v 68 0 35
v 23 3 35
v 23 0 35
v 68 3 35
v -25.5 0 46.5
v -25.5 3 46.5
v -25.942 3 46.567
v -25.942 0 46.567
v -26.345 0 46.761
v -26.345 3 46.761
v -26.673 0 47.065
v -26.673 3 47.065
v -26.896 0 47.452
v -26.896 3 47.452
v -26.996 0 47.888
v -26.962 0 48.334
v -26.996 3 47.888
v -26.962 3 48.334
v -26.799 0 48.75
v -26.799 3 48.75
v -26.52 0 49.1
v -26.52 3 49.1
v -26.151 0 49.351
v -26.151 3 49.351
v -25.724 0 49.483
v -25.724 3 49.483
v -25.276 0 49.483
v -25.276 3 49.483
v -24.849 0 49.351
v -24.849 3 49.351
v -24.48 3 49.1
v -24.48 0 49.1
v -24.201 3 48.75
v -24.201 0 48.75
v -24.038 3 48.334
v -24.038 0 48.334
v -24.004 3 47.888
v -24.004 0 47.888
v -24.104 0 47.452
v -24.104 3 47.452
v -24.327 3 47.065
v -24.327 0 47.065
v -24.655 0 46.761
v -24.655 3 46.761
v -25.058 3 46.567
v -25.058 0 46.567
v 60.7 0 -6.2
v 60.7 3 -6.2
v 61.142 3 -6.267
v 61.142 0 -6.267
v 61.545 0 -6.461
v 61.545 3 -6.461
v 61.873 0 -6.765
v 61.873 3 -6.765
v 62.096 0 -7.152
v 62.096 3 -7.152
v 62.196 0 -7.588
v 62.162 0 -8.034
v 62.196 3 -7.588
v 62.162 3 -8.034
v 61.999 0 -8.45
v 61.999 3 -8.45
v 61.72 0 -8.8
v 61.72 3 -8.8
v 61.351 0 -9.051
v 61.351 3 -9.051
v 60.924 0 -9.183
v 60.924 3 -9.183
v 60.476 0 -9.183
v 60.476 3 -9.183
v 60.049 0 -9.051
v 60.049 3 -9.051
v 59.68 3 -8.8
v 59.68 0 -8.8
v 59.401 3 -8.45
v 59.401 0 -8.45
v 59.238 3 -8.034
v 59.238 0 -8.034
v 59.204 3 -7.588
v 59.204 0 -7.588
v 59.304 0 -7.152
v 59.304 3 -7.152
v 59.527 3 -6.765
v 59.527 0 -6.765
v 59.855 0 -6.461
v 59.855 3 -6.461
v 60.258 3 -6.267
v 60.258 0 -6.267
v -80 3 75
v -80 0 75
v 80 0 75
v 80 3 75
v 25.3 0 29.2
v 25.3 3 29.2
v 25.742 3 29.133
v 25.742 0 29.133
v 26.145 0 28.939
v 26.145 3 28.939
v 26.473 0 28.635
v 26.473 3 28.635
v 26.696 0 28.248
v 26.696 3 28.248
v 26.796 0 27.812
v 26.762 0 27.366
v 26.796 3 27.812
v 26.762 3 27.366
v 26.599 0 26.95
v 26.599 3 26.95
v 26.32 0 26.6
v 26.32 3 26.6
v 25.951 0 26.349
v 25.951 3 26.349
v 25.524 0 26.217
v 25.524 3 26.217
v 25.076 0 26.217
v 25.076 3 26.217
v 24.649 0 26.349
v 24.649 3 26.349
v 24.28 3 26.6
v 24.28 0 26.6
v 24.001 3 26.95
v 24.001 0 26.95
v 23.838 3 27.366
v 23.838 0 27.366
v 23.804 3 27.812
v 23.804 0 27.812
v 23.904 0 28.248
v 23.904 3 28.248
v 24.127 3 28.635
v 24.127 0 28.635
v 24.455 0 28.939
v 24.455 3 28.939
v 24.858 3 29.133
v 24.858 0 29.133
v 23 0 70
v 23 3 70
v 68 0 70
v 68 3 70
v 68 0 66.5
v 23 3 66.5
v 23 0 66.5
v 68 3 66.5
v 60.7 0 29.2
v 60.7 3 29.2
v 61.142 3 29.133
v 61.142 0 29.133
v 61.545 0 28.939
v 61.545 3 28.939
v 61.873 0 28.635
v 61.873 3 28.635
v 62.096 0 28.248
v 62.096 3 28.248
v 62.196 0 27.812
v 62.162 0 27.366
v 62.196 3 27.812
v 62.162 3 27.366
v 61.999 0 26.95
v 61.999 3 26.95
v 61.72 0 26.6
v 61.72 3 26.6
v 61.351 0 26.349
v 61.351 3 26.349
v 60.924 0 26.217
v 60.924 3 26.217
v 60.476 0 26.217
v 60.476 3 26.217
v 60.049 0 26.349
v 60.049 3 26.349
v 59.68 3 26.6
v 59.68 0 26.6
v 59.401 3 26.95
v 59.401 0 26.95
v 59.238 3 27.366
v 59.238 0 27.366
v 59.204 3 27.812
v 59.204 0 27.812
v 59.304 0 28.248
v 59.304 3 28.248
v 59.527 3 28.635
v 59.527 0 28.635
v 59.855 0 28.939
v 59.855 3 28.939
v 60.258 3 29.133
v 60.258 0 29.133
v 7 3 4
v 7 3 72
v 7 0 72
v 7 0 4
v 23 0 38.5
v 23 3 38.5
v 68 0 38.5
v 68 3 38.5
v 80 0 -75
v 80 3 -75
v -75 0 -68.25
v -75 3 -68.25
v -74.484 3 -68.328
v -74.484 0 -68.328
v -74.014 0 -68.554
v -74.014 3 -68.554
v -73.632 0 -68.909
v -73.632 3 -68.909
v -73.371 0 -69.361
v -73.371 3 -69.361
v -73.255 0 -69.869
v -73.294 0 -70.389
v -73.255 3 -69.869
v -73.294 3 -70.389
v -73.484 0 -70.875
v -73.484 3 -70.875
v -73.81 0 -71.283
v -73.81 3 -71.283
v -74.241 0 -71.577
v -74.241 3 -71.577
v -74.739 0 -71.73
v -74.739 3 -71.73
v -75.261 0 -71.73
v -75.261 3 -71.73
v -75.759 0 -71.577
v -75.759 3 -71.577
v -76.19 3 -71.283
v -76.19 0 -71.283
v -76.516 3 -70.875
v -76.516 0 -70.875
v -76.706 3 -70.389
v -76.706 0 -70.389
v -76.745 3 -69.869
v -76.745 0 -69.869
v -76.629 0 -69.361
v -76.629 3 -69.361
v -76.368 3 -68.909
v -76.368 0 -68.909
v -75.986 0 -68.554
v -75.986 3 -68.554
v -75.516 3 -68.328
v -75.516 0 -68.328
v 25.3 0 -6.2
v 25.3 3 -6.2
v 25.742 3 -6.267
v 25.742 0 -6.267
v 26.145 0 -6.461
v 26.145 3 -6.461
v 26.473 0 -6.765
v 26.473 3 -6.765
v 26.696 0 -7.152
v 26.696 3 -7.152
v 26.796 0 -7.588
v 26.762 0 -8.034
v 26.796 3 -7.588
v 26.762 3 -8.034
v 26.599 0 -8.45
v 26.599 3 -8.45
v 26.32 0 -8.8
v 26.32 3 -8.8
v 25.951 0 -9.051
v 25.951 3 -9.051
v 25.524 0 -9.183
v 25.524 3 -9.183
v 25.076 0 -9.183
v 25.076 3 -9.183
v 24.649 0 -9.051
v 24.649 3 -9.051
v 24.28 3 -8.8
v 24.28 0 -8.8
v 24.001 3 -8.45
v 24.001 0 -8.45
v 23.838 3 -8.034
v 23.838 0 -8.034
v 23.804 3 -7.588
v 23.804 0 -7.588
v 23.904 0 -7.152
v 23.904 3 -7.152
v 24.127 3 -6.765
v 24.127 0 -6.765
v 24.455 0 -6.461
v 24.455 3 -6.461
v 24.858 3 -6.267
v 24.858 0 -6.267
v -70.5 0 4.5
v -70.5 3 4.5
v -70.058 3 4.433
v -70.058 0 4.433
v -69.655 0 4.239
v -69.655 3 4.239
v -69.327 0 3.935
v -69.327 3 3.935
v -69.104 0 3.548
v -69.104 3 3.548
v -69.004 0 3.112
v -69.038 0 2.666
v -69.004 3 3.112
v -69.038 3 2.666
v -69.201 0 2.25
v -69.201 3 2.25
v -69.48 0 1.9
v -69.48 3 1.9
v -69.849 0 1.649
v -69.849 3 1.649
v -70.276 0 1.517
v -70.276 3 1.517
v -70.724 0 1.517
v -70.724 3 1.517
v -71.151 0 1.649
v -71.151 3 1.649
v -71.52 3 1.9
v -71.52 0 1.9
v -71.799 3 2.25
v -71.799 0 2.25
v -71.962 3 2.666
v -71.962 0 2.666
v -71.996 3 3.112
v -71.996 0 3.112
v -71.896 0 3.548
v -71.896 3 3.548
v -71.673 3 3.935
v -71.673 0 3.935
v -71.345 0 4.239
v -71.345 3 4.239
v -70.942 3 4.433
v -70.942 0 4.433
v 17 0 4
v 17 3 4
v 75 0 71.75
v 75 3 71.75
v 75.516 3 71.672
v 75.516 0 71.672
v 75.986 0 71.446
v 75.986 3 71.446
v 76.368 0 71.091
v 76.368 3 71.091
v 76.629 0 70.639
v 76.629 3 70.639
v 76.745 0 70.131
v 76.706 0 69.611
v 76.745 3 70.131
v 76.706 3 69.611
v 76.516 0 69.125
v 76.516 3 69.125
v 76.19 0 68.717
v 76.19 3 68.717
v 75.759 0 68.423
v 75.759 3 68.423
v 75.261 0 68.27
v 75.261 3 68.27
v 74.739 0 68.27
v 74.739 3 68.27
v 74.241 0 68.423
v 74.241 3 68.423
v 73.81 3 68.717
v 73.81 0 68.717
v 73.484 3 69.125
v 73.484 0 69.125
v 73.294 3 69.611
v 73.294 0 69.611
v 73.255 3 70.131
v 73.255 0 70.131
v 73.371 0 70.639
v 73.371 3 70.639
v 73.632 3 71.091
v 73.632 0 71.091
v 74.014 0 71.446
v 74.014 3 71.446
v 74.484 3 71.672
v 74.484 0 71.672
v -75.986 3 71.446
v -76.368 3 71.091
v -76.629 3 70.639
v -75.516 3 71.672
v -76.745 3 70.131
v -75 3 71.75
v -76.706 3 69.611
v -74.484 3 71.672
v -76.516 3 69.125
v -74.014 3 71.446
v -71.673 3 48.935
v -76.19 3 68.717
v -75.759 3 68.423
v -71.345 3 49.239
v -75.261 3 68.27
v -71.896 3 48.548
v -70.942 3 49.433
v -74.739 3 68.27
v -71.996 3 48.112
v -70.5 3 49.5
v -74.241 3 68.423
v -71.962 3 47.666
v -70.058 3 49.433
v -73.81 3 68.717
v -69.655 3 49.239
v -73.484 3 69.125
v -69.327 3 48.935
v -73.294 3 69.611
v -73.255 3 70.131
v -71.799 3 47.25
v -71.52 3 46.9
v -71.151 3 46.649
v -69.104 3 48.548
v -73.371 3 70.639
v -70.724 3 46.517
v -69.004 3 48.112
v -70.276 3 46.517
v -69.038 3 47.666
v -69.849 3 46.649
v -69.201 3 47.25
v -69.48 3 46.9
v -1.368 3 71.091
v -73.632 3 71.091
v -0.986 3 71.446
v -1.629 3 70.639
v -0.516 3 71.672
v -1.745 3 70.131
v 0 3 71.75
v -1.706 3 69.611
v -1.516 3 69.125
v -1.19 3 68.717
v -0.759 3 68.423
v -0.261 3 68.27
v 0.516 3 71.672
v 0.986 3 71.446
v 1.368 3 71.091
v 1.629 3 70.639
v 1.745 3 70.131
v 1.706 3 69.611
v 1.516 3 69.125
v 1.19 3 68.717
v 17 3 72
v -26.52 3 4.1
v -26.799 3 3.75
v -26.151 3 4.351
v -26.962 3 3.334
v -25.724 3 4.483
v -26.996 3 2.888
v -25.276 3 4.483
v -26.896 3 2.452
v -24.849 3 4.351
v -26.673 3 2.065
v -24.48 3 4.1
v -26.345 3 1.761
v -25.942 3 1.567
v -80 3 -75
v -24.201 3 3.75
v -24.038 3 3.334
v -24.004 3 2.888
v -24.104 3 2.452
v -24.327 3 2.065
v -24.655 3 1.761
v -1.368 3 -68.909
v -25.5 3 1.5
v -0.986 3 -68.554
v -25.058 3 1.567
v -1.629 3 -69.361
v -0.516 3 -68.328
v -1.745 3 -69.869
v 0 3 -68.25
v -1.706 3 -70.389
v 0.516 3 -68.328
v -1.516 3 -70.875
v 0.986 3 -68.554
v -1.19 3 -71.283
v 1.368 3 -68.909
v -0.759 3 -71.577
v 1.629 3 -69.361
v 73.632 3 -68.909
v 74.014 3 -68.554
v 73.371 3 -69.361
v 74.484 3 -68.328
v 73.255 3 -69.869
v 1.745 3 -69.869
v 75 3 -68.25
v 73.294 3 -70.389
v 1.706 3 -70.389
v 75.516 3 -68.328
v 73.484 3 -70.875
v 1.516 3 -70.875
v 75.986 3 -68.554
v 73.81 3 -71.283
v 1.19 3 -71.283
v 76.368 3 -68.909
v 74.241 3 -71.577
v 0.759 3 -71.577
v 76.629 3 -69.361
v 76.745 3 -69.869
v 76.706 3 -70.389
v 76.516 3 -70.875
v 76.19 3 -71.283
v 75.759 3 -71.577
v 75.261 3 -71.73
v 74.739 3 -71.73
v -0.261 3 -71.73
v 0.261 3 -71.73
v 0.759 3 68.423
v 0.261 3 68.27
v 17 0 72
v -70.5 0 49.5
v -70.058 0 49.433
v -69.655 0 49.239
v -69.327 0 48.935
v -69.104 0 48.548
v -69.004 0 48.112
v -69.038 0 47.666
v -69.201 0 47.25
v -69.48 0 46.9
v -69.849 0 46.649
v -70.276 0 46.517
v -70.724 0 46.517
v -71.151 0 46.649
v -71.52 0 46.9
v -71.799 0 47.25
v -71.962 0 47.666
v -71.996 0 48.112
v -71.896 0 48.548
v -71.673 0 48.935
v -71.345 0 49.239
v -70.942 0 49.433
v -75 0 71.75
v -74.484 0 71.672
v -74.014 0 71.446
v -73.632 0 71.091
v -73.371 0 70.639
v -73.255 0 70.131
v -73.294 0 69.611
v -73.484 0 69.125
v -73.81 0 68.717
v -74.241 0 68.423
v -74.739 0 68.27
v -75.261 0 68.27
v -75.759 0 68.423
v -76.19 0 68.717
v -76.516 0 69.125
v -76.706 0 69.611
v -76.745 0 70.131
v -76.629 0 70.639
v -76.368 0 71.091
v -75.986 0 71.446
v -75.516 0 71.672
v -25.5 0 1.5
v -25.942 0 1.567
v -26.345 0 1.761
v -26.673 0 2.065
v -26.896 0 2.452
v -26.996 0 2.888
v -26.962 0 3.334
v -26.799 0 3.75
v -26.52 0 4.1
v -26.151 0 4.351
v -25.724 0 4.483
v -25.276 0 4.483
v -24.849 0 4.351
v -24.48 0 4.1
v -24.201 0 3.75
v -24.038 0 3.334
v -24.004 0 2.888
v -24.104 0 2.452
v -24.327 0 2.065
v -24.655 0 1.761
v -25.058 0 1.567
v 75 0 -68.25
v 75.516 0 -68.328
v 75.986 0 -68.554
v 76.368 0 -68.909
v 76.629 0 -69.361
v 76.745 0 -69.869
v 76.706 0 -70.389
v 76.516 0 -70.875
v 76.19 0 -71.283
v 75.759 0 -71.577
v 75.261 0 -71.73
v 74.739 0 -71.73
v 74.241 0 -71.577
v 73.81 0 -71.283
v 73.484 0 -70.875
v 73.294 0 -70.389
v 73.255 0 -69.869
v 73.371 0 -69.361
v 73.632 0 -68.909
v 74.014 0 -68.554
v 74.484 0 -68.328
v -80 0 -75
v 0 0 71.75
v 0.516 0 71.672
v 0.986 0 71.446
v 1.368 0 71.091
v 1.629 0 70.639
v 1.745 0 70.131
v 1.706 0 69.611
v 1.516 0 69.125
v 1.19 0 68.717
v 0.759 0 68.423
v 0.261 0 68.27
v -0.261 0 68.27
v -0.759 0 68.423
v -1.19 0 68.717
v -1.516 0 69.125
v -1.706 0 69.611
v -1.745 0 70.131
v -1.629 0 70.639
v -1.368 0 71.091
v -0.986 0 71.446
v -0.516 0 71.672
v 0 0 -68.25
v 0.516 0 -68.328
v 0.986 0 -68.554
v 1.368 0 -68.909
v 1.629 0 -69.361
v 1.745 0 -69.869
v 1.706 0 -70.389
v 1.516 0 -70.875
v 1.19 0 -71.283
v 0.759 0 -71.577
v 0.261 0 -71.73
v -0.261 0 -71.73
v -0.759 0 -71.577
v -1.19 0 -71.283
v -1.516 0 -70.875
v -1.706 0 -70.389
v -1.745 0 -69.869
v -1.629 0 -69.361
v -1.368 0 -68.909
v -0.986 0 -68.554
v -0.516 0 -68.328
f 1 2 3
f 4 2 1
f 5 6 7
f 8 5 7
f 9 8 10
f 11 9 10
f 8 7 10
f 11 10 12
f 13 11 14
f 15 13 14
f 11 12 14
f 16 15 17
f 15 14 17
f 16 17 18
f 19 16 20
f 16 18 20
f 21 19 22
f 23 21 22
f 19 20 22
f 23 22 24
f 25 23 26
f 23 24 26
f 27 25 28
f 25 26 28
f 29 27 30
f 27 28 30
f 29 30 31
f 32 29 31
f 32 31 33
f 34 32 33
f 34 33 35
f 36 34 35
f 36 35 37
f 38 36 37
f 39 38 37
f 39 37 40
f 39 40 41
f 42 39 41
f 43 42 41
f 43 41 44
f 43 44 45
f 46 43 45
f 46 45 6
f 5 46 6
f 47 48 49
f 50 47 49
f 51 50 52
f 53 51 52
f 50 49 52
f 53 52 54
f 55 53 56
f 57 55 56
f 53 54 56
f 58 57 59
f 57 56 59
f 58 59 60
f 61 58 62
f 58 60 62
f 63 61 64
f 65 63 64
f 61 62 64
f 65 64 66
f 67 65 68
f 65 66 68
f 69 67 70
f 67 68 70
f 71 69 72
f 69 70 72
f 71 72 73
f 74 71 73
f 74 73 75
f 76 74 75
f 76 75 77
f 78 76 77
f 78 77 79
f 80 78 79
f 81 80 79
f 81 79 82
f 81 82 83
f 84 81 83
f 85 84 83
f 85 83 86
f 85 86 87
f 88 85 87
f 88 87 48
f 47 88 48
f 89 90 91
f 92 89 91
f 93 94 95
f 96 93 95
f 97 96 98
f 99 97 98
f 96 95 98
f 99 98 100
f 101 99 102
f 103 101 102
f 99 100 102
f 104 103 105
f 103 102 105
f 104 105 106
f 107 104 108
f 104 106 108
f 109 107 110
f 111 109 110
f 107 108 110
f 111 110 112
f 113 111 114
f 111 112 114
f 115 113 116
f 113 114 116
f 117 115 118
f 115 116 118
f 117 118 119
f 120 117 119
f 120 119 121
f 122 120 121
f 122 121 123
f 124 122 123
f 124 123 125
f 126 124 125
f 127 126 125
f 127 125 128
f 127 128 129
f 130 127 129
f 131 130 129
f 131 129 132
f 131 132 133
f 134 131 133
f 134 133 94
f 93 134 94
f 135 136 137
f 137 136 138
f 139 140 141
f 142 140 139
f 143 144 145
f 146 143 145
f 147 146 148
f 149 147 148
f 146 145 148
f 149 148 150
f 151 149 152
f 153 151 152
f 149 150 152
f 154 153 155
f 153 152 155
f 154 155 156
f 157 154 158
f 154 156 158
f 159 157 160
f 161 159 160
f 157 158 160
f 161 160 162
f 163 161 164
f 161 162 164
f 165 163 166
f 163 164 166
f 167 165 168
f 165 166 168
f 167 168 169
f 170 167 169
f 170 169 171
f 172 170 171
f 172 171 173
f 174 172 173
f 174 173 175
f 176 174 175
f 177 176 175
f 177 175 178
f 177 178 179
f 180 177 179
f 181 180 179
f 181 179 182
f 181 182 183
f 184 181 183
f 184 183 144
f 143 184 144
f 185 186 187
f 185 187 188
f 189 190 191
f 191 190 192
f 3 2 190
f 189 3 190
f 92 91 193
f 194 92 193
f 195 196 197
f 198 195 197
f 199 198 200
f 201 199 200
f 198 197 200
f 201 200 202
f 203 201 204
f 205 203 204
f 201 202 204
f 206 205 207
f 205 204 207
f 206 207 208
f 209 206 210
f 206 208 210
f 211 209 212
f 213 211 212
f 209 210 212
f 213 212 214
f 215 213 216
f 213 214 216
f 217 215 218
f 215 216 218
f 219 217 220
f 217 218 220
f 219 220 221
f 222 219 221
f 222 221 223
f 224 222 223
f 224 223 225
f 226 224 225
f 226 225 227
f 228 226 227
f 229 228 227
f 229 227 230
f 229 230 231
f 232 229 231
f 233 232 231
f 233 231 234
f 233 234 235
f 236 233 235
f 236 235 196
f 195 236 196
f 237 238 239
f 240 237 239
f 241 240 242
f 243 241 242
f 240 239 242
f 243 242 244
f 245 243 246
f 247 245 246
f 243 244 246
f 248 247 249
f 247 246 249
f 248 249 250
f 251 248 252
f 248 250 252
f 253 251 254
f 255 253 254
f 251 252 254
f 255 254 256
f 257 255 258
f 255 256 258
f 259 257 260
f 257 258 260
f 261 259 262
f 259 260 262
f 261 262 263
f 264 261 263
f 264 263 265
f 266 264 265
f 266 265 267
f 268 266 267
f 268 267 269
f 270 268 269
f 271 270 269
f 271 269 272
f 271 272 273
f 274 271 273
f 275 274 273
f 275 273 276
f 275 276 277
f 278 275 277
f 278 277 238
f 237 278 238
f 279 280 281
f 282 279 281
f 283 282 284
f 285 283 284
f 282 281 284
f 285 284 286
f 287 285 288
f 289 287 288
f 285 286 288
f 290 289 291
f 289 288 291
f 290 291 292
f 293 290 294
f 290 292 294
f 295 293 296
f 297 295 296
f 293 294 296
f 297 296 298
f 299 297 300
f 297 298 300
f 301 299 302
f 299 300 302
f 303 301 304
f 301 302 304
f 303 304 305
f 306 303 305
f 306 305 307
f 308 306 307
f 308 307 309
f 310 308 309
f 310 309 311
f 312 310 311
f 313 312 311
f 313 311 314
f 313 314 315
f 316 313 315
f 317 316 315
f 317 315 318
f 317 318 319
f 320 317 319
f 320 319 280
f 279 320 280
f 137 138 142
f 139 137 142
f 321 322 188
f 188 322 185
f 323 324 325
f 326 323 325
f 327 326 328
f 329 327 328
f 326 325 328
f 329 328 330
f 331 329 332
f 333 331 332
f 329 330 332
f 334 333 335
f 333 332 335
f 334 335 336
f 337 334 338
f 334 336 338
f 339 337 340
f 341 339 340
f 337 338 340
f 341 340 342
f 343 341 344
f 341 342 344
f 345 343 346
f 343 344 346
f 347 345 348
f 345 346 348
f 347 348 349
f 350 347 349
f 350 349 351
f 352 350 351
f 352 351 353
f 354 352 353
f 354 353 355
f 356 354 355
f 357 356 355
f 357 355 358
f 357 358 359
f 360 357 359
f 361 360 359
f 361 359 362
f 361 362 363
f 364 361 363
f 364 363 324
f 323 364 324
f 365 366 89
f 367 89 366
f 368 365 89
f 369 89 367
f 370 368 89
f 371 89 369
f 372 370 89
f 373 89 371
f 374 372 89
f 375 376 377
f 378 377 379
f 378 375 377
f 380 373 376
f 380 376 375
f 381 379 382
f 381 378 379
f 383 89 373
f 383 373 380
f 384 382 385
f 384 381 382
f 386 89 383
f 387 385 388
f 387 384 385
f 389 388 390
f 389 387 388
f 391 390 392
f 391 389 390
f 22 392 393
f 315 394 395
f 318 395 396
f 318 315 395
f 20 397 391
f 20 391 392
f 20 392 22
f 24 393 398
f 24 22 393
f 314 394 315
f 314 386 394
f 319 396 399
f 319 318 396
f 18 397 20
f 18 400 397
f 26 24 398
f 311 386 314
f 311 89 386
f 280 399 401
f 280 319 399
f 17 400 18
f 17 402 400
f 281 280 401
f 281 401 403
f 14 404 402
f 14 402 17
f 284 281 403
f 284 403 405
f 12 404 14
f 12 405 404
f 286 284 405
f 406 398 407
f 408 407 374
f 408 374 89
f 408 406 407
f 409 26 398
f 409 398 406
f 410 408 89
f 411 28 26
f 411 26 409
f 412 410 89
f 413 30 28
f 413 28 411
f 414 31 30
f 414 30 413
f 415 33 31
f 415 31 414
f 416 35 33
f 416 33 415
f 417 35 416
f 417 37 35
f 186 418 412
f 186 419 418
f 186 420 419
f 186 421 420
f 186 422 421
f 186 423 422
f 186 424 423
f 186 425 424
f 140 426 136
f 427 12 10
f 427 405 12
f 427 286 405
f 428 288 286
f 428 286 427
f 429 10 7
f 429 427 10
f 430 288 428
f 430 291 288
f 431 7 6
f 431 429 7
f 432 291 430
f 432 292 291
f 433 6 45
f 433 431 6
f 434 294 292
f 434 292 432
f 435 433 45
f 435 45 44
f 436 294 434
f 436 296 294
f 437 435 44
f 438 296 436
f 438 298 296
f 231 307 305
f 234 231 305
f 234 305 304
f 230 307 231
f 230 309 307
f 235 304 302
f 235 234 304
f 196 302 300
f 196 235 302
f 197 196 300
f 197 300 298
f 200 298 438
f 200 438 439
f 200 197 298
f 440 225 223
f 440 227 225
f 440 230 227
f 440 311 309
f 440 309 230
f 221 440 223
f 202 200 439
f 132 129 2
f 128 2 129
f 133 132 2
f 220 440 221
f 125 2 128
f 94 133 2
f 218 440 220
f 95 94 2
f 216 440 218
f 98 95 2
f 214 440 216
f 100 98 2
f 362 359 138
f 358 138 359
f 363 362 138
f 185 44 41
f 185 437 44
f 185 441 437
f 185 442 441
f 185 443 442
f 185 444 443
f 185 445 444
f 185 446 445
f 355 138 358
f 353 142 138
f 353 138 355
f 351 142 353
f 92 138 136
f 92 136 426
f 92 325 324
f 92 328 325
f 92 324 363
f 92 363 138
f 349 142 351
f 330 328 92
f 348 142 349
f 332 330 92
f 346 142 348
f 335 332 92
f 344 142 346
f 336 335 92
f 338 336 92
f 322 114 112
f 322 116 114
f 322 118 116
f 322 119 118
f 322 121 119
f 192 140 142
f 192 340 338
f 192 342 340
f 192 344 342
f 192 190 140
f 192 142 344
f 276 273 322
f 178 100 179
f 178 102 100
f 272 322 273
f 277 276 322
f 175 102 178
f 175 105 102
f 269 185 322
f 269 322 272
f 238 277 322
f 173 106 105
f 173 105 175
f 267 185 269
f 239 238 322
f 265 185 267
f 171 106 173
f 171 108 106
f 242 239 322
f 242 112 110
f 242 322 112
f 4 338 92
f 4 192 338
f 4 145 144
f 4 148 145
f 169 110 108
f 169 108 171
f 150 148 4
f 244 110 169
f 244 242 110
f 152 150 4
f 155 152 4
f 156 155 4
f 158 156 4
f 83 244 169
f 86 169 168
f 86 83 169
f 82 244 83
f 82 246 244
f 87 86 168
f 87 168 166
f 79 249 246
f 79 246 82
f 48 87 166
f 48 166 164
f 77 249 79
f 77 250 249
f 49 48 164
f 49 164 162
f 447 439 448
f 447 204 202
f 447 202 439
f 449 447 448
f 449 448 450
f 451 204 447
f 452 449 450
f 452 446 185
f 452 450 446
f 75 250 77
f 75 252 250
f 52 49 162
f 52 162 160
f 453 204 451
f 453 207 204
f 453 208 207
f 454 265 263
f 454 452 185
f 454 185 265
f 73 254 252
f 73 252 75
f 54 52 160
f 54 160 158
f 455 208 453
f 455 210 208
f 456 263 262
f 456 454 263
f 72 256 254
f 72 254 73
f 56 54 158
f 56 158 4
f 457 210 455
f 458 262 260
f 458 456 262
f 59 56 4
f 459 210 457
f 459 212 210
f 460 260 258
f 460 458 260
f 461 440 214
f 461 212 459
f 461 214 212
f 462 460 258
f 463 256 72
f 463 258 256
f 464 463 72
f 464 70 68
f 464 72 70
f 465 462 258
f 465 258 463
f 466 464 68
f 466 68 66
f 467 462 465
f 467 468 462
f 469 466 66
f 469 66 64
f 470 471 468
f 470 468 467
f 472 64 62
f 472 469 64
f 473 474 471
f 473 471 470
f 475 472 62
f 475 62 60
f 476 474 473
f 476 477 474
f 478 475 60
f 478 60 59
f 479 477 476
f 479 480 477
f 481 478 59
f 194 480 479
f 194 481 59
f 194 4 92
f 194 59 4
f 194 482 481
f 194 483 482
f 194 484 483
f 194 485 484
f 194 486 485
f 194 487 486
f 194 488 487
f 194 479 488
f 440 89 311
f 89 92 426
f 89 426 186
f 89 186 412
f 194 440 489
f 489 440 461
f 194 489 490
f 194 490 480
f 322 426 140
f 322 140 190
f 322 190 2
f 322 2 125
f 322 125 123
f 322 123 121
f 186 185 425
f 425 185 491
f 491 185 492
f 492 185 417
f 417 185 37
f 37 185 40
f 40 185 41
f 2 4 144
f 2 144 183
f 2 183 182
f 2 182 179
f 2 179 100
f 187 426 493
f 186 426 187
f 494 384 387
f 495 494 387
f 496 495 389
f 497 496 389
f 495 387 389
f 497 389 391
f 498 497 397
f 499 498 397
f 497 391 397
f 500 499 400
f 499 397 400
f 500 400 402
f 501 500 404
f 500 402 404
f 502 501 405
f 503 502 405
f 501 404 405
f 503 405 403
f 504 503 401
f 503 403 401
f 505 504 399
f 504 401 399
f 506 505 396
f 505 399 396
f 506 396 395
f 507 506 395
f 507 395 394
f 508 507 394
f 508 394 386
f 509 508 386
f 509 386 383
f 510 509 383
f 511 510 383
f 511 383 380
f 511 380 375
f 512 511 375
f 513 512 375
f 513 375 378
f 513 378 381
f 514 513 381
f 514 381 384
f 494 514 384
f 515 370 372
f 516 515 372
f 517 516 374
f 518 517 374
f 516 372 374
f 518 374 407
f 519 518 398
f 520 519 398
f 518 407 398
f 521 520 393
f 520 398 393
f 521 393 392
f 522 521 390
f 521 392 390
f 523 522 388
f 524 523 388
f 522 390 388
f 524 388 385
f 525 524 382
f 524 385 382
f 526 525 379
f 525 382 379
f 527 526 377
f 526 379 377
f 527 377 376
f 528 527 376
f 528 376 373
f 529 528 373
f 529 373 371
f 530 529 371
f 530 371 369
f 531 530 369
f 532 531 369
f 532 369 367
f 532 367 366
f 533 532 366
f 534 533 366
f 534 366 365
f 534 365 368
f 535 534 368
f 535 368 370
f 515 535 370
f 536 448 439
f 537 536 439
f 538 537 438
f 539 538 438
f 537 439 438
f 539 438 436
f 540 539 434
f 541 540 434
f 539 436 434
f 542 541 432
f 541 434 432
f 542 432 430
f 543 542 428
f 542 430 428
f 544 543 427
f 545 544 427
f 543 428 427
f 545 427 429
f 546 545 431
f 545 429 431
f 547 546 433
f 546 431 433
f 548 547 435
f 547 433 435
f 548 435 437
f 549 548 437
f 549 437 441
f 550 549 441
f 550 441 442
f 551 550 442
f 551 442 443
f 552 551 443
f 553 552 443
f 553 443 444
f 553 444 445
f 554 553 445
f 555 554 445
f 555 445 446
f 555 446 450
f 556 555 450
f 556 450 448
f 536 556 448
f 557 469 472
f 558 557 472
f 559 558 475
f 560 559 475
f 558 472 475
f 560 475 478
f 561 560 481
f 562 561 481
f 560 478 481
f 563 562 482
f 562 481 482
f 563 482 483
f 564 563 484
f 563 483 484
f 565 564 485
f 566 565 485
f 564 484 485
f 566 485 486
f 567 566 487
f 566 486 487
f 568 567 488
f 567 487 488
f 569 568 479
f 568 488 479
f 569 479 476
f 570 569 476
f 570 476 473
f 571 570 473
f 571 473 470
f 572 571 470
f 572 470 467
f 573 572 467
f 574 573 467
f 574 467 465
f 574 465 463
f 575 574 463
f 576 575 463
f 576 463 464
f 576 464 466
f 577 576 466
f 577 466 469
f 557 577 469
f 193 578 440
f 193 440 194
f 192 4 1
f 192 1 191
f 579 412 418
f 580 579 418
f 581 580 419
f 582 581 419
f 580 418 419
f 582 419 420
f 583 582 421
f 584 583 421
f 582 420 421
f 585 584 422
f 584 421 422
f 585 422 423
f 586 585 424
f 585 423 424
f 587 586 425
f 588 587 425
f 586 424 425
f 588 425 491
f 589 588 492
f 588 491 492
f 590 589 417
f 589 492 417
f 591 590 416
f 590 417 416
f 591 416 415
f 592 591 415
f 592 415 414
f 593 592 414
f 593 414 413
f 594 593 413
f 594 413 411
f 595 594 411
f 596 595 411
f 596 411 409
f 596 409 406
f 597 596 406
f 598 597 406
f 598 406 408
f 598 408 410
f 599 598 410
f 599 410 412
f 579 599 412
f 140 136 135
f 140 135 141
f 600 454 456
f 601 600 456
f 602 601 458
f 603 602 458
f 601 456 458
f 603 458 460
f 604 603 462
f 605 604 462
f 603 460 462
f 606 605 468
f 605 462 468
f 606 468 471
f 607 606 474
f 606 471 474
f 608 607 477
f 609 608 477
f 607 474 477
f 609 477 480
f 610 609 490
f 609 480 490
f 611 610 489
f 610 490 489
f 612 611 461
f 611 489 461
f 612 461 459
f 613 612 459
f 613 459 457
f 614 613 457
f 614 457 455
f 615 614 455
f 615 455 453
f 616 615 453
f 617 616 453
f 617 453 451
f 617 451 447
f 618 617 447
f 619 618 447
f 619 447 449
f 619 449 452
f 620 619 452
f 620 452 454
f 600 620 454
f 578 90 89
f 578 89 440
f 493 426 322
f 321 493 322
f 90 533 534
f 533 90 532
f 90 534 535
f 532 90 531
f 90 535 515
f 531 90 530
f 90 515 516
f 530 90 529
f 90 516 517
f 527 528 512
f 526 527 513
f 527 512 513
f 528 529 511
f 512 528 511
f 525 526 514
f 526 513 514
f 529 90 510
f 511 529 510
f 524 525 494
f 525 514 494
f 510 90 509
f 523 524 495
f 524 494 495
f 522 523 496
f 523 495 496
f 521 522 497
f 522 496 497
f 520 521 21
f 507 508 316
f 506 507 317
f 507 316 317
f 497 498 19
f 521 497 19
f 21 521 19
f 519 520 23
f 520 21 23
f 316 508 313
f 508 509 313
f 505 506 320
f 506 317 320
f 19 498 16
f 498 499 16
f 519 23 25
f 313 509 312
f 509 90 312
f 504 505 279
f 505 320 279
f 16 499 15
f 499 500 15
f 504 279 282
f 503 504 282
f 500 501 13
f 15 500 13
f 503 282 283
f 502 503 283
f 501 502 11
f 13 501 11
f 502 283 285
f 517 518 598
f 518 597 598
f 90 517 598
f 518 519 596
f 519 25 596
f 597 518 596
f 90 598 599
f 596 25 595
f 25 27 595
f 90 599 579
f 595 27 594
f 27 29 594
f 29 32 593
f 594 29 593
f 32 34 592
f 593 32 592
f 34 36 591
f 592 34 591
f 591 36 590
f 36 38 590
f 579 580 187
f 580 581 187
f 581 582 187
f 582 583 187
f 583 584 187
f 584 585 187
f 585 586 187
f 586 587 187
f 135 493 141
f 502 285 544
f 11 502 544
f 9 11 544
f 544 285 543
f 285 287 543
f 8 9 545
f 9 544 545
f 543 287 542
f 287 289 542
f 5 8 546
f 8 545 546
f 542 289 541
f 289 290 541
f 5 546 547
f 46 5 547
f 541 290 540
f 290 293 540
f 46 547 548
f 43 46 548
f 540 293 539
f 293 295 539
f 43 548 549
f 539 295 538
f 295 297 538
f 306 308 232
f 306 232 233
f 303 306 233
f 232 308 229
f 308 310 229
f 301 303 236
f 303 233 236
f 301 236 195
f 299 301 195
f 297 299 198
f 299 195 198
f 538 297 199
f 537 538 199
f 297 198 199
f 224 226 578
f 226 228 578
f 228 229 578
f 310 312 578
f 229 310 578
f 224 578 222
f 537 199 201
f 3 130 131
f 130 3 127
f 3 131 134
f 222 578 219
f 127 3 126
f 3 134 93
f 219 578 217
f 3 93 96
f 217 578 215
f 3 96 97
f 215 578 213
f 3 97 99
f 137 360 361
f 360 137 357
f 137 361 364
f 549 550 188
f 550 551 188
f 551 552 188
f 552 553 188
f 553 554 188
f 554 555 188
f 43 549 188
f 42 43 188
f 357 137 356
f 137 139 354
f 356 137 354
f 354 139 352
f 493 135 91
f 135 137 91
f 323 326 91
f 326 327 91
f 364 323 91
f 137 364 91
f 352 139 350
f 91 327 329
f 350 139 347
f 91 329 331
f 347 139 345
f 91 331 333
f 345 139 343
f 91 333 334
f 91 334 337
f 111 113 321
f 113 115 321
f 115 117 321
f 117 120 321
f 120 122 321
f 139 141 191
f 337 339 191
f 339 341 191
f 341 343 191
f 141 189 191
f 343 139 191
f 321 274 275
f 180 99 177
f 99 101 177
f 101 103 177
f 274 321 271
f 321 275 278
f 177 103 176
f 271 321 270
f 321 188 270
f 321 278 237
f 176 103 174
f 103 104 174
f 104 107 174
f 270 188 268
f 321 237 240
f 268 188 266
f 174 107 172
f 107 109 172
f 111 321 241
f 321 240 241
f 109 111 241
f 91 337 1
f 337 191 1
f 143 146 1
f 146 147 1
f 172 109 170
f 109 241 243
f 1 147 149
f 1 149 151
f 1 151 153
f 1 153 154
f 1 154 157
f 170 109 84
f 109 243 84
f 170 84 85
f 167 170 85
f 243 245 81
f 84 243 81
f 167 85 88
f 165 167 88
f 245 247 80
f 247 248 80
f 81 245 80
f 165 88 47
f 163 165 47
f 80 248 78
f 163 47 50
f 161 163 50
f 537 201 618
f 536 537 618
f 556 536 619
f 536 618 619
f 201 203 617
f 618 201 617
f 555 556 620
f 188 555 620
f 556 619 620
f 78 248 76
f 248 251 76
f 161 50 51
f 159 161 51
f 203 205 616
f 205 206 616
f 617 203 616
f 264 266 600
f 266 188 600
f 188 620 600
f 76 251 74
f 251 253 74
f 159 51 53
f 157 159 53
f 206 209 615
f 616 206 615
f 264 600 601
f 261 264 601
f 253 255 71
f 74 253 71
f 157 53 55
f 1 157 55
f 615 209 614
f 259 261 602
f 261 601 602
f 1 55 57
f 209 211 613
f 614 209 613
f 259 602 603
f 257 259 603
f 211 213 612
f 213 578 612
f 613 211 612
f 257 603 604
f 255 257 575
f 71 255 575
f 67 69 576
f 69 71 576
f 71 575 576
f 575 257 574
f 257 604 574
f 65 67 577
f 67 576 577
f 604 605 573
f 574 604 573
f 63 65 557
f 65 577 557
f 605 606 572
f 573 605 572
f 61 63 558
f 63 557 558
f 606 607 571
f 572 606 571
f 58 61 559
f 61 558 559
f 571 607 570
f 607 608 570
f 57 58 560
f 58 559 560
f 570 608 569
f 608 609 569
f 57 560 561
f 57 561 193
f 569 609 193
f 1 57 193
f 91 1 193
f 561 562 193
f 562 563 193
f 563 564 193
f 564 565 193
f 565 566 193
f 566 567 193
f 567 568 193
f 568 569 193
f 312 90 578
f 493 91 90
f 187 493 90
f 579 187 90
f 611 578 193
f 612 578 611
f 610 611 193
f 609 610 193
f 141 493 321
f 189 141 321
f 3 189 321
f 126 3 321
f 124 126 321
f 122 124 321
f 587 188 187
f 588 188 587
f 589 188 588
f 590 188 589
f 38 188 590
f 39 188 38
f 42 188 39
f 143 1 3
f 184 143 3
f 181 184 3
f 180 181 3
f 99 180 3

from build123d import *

# Parameters (mm, degrees)
SCHIZZO1_W                      = 160
SCHIZZO1_H                      = 150
BASE_DEPTH                      = 3
SCHIZZO2_W                      = 10
SCHIZZO2_H                      = 68
TAGLIOPMSINISTRA_DEPTH          = 110.69958979
SCHIZZO6_W                      = 45
SCHIZZO6_H                      = 3.5
FOROBECBASSO_DEPTH              = 110.69958979
SCHIZZO8_R                      = 1.5
FORIVITIPM_DEPTH                = 110.69958979
SCHIZZO9_R                      = 1.5
FORIVITICOMPANION_DEPTH         = 110.69958979
SCHIZZO12_R                     = 1.75
FORICOLLEGAMENTOFUSOLIERA_DEPTH = 110.69958979
SCHIZZO13_W                     = 10
SCHIZZO13_H                     = 68
CHIUSURATAGLIOSINISTROPM_DEPTH  = 3


with BuildPart() as part:
    # Schizzo1 → Base (new body)
    with BuildSketch(Plane(origin=(0, 0, 0), x_dir=(1, 0, 0), z_dir=(0, 1, 0))):
        Rectangle(SCHIZZO1_W, SCHIZZO1_H)
    extrude(amount=BASE_DEPTH)

    # Schizzo2 → TaglioPMSinistra (cut, through all)
    with BuildSketch(Plane(origin=(0, 3, 0), x_dir=(1, 0, 0), z_dir=(0, 1, 0))):
        with Locations((-58, -38)):
            Rectangle(SCHIZZO2_W, SCHIZZO2_H)
    tagliopmsinistra = extrude(amount=-TAGLIOPMSINISTRA_DEPTH, mode=Mode.SUBTRACT)

    # TaglioPMDestra: TaglioPMSinistra across plane
    add(tagliopmsinistra.mirror(Plane(origin=(-23, 0, 0), x_dir=(0, 0, 1), z_dir=(1, 0, 0))), mode=Mode.SUBTRACT)

    # Schizzo6 → ForoBECBasso (cut, through all)
    with BuildSketch(Plane(origin=(0, 3, 0), x_dir=(1, 0, 0), z_dir=(0, 1, 0))):
        with Locations((45.5, -68.25)):
            Rectangle(SCHIZZO6_W, SCHIZZO6_H)
    forobecbasso = extrude(amount=-FOROBECBASSO_DEPTH, mode=Mode.SUBTRACT)

    # ForoBECAlto: ForoBECBasso across plane
    add(forobecbasso.mirror(Plane.XY.offset(52.5)), mode=Mode.SUBTRACT)

    # Schizzo8 → ForiVitiPM (cut, through all)
    with BuildSketch(Plane(origin=(0, 3, 0), x_dir=(1, 0, 0), z_dir=(0, 1, 0))):
        with Locations(Location((-70.5, -3, 0), (0, 0, 270))):
            Circle(SCHIZZO8_R)
        with Locations(Location((-70.5, -48, 0), (0, 0, 270))):
            Circle(SCHIZZO8_R)
        with Locations(Location((-25.5, -48, 0), (0, 0, 90))):
            Circle(SCHIZZO8_R)
        with Locations(Location((-25.5, -3, 0), (0, 0, 90))):
            Circle(SCHIZZO8_R)
    extrude(amount=-FORIVITIPM_DEPTH, mode=Mode.SUBTRACT)

    # Schizzo9 → ForiVitiCompanion (cut, through all)
    with BuildSketch(Plane(origin=(0, 3, 0), x_dir=(1, 0, 0), z_dir=(0, 1, 0))):
        with Locations(Location((60.7, -27.7, 0), (0, 0, 270))):
            Circle(SCHIZZO9_R)
        with Locations(Location((25.3, -27.7, 0), (0, 0, 270))):
            Circle(SCHIZZO9_R)
        with Locations(Location((25.3, 7.7, 0), (0, 0, 270))):
            Circle(SCHIZZO9_R)
        with Locations(Location((60.7, 7.7, 0), (0, 0, 270))):
            Circle(SCHIZZO9_R)
    extrude(amount=-FORIVITICOMPANION_DEPTH, mode=Mode.SUBTRACT)

    # Schizzo12 → ForiCollegamentoFusoliera (cut, through all)
    with BuildSketch(Plane(origin=(0, 3, 0), x_dir=(1, 0, 0), z_dir=(0, 1, 0))):
        with Locations(Location((-75, 70, 0), (0, 0, 270))):
            Circle(SCHIZZO12_R)
        with Locations(Location((75, 70, 0), (0, 0, 270))):
            Circle(SCHIZZO12_R)
        with Locations(Location((0, 70, 0), (0, 0, 270))):
            Circle(SCHIZZO12_R)
        with Locations(Location((-75, -70, 0), (0, 0, 270))):
            Circle(SCHIZZO12_R)
        with Locations(Location((0, -70, 0), (0, 0, 270))):
            Circle(SCHIZZO12_R)
        with Locations(Location((75, -70, 0), (0, 0, 270))):
            Circle(SCHIZZO12_R)
    extrude(amount=-FORICOLLEGAMENTOFUSOLIERA_DEPTH, mode=Mode.SUBTRACT)

    # Schizzo13 → ChiusuraTaglioSinistroPM (add, through all)
    with BuildSketch(Plane(origin=(0, 3, 0), x_dir=(1, 0, 0), z_dir=(0, 1, 0))):
        with Locations((-58, -38)):
            Rectangle(SCHIZZO13_W, SCHIZZO13_H)
    extrude(amount=-CHIUSURATAGLIOSINISTROPM_DEPTH)


solid = part.part
